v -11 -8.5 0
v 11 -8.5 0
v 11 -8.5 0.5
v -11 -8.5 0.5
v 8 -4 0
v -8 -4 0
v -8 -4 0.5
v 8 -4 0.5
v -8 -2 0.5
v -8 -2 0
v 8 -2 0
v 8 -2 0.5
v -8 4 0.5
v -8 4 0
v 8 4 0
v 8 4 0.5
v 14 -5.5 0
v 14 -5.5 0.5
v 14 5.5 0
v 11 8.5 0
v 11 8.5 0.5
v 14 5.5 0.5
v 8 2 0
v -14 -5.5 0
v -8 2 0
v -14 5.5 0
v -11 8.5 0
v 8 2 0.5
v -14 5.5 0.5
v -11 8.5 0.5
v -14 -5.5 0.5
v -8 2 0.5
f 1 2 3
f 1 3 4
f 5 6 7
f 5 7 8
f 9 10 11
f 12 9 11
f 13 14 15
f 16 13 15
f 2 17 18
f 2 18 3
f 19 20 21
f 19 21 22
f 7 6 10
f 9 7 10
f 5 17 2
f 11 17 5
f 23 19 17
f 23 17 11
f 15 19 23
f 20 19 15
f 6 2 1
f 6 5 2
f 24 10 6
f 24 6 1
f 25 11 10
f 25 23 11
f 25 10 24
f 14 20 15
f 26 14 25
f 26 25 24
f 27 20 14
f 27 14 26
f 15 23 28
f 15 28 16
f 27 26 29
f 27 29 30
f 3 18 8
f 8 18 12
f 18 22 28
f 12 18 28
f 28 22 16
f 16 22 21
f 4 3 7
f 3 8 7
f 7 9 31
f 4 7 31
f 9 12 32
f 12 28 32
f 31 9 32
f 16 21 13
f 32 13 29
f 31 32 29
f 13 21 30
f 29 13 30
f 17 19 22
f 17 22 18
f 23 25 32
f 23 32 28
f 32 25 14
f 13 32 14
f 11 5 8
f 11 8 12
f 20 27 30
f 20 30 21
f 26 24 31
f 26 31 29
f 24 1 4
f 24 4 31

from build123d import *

# Parameters (mm, degrees)
SKETCH_1_W      = 16
SKETCH_1_H      = 2
EXTRUDE_1_DEPTH = 0.5


with BuildPart() as part:
    # 草图1 → 凸台-拉伸1 (new body)
    with BuildSketch(Plane.XY):
        Polygon((-14, 5.5), (-11, 8.5), (11, 8.5), (14, 5.5), (14, -5.5), (11, -8.5), (-11, -8.5), (-14, -5.5), align=None)
        with Locations((0, 3)):
            Rectangle(SKETCH_1_W, SKETCH_1_H, mode=Mode.SUBTRACT)
        with Locations((0, -3)):
            Rectangle(SKETCH_1_W, SKETCH_1_H, mode=Mode.SUBTRACT)
    extrude(amount=EXTRUDE_1_DEPTH)


solid = part.part
